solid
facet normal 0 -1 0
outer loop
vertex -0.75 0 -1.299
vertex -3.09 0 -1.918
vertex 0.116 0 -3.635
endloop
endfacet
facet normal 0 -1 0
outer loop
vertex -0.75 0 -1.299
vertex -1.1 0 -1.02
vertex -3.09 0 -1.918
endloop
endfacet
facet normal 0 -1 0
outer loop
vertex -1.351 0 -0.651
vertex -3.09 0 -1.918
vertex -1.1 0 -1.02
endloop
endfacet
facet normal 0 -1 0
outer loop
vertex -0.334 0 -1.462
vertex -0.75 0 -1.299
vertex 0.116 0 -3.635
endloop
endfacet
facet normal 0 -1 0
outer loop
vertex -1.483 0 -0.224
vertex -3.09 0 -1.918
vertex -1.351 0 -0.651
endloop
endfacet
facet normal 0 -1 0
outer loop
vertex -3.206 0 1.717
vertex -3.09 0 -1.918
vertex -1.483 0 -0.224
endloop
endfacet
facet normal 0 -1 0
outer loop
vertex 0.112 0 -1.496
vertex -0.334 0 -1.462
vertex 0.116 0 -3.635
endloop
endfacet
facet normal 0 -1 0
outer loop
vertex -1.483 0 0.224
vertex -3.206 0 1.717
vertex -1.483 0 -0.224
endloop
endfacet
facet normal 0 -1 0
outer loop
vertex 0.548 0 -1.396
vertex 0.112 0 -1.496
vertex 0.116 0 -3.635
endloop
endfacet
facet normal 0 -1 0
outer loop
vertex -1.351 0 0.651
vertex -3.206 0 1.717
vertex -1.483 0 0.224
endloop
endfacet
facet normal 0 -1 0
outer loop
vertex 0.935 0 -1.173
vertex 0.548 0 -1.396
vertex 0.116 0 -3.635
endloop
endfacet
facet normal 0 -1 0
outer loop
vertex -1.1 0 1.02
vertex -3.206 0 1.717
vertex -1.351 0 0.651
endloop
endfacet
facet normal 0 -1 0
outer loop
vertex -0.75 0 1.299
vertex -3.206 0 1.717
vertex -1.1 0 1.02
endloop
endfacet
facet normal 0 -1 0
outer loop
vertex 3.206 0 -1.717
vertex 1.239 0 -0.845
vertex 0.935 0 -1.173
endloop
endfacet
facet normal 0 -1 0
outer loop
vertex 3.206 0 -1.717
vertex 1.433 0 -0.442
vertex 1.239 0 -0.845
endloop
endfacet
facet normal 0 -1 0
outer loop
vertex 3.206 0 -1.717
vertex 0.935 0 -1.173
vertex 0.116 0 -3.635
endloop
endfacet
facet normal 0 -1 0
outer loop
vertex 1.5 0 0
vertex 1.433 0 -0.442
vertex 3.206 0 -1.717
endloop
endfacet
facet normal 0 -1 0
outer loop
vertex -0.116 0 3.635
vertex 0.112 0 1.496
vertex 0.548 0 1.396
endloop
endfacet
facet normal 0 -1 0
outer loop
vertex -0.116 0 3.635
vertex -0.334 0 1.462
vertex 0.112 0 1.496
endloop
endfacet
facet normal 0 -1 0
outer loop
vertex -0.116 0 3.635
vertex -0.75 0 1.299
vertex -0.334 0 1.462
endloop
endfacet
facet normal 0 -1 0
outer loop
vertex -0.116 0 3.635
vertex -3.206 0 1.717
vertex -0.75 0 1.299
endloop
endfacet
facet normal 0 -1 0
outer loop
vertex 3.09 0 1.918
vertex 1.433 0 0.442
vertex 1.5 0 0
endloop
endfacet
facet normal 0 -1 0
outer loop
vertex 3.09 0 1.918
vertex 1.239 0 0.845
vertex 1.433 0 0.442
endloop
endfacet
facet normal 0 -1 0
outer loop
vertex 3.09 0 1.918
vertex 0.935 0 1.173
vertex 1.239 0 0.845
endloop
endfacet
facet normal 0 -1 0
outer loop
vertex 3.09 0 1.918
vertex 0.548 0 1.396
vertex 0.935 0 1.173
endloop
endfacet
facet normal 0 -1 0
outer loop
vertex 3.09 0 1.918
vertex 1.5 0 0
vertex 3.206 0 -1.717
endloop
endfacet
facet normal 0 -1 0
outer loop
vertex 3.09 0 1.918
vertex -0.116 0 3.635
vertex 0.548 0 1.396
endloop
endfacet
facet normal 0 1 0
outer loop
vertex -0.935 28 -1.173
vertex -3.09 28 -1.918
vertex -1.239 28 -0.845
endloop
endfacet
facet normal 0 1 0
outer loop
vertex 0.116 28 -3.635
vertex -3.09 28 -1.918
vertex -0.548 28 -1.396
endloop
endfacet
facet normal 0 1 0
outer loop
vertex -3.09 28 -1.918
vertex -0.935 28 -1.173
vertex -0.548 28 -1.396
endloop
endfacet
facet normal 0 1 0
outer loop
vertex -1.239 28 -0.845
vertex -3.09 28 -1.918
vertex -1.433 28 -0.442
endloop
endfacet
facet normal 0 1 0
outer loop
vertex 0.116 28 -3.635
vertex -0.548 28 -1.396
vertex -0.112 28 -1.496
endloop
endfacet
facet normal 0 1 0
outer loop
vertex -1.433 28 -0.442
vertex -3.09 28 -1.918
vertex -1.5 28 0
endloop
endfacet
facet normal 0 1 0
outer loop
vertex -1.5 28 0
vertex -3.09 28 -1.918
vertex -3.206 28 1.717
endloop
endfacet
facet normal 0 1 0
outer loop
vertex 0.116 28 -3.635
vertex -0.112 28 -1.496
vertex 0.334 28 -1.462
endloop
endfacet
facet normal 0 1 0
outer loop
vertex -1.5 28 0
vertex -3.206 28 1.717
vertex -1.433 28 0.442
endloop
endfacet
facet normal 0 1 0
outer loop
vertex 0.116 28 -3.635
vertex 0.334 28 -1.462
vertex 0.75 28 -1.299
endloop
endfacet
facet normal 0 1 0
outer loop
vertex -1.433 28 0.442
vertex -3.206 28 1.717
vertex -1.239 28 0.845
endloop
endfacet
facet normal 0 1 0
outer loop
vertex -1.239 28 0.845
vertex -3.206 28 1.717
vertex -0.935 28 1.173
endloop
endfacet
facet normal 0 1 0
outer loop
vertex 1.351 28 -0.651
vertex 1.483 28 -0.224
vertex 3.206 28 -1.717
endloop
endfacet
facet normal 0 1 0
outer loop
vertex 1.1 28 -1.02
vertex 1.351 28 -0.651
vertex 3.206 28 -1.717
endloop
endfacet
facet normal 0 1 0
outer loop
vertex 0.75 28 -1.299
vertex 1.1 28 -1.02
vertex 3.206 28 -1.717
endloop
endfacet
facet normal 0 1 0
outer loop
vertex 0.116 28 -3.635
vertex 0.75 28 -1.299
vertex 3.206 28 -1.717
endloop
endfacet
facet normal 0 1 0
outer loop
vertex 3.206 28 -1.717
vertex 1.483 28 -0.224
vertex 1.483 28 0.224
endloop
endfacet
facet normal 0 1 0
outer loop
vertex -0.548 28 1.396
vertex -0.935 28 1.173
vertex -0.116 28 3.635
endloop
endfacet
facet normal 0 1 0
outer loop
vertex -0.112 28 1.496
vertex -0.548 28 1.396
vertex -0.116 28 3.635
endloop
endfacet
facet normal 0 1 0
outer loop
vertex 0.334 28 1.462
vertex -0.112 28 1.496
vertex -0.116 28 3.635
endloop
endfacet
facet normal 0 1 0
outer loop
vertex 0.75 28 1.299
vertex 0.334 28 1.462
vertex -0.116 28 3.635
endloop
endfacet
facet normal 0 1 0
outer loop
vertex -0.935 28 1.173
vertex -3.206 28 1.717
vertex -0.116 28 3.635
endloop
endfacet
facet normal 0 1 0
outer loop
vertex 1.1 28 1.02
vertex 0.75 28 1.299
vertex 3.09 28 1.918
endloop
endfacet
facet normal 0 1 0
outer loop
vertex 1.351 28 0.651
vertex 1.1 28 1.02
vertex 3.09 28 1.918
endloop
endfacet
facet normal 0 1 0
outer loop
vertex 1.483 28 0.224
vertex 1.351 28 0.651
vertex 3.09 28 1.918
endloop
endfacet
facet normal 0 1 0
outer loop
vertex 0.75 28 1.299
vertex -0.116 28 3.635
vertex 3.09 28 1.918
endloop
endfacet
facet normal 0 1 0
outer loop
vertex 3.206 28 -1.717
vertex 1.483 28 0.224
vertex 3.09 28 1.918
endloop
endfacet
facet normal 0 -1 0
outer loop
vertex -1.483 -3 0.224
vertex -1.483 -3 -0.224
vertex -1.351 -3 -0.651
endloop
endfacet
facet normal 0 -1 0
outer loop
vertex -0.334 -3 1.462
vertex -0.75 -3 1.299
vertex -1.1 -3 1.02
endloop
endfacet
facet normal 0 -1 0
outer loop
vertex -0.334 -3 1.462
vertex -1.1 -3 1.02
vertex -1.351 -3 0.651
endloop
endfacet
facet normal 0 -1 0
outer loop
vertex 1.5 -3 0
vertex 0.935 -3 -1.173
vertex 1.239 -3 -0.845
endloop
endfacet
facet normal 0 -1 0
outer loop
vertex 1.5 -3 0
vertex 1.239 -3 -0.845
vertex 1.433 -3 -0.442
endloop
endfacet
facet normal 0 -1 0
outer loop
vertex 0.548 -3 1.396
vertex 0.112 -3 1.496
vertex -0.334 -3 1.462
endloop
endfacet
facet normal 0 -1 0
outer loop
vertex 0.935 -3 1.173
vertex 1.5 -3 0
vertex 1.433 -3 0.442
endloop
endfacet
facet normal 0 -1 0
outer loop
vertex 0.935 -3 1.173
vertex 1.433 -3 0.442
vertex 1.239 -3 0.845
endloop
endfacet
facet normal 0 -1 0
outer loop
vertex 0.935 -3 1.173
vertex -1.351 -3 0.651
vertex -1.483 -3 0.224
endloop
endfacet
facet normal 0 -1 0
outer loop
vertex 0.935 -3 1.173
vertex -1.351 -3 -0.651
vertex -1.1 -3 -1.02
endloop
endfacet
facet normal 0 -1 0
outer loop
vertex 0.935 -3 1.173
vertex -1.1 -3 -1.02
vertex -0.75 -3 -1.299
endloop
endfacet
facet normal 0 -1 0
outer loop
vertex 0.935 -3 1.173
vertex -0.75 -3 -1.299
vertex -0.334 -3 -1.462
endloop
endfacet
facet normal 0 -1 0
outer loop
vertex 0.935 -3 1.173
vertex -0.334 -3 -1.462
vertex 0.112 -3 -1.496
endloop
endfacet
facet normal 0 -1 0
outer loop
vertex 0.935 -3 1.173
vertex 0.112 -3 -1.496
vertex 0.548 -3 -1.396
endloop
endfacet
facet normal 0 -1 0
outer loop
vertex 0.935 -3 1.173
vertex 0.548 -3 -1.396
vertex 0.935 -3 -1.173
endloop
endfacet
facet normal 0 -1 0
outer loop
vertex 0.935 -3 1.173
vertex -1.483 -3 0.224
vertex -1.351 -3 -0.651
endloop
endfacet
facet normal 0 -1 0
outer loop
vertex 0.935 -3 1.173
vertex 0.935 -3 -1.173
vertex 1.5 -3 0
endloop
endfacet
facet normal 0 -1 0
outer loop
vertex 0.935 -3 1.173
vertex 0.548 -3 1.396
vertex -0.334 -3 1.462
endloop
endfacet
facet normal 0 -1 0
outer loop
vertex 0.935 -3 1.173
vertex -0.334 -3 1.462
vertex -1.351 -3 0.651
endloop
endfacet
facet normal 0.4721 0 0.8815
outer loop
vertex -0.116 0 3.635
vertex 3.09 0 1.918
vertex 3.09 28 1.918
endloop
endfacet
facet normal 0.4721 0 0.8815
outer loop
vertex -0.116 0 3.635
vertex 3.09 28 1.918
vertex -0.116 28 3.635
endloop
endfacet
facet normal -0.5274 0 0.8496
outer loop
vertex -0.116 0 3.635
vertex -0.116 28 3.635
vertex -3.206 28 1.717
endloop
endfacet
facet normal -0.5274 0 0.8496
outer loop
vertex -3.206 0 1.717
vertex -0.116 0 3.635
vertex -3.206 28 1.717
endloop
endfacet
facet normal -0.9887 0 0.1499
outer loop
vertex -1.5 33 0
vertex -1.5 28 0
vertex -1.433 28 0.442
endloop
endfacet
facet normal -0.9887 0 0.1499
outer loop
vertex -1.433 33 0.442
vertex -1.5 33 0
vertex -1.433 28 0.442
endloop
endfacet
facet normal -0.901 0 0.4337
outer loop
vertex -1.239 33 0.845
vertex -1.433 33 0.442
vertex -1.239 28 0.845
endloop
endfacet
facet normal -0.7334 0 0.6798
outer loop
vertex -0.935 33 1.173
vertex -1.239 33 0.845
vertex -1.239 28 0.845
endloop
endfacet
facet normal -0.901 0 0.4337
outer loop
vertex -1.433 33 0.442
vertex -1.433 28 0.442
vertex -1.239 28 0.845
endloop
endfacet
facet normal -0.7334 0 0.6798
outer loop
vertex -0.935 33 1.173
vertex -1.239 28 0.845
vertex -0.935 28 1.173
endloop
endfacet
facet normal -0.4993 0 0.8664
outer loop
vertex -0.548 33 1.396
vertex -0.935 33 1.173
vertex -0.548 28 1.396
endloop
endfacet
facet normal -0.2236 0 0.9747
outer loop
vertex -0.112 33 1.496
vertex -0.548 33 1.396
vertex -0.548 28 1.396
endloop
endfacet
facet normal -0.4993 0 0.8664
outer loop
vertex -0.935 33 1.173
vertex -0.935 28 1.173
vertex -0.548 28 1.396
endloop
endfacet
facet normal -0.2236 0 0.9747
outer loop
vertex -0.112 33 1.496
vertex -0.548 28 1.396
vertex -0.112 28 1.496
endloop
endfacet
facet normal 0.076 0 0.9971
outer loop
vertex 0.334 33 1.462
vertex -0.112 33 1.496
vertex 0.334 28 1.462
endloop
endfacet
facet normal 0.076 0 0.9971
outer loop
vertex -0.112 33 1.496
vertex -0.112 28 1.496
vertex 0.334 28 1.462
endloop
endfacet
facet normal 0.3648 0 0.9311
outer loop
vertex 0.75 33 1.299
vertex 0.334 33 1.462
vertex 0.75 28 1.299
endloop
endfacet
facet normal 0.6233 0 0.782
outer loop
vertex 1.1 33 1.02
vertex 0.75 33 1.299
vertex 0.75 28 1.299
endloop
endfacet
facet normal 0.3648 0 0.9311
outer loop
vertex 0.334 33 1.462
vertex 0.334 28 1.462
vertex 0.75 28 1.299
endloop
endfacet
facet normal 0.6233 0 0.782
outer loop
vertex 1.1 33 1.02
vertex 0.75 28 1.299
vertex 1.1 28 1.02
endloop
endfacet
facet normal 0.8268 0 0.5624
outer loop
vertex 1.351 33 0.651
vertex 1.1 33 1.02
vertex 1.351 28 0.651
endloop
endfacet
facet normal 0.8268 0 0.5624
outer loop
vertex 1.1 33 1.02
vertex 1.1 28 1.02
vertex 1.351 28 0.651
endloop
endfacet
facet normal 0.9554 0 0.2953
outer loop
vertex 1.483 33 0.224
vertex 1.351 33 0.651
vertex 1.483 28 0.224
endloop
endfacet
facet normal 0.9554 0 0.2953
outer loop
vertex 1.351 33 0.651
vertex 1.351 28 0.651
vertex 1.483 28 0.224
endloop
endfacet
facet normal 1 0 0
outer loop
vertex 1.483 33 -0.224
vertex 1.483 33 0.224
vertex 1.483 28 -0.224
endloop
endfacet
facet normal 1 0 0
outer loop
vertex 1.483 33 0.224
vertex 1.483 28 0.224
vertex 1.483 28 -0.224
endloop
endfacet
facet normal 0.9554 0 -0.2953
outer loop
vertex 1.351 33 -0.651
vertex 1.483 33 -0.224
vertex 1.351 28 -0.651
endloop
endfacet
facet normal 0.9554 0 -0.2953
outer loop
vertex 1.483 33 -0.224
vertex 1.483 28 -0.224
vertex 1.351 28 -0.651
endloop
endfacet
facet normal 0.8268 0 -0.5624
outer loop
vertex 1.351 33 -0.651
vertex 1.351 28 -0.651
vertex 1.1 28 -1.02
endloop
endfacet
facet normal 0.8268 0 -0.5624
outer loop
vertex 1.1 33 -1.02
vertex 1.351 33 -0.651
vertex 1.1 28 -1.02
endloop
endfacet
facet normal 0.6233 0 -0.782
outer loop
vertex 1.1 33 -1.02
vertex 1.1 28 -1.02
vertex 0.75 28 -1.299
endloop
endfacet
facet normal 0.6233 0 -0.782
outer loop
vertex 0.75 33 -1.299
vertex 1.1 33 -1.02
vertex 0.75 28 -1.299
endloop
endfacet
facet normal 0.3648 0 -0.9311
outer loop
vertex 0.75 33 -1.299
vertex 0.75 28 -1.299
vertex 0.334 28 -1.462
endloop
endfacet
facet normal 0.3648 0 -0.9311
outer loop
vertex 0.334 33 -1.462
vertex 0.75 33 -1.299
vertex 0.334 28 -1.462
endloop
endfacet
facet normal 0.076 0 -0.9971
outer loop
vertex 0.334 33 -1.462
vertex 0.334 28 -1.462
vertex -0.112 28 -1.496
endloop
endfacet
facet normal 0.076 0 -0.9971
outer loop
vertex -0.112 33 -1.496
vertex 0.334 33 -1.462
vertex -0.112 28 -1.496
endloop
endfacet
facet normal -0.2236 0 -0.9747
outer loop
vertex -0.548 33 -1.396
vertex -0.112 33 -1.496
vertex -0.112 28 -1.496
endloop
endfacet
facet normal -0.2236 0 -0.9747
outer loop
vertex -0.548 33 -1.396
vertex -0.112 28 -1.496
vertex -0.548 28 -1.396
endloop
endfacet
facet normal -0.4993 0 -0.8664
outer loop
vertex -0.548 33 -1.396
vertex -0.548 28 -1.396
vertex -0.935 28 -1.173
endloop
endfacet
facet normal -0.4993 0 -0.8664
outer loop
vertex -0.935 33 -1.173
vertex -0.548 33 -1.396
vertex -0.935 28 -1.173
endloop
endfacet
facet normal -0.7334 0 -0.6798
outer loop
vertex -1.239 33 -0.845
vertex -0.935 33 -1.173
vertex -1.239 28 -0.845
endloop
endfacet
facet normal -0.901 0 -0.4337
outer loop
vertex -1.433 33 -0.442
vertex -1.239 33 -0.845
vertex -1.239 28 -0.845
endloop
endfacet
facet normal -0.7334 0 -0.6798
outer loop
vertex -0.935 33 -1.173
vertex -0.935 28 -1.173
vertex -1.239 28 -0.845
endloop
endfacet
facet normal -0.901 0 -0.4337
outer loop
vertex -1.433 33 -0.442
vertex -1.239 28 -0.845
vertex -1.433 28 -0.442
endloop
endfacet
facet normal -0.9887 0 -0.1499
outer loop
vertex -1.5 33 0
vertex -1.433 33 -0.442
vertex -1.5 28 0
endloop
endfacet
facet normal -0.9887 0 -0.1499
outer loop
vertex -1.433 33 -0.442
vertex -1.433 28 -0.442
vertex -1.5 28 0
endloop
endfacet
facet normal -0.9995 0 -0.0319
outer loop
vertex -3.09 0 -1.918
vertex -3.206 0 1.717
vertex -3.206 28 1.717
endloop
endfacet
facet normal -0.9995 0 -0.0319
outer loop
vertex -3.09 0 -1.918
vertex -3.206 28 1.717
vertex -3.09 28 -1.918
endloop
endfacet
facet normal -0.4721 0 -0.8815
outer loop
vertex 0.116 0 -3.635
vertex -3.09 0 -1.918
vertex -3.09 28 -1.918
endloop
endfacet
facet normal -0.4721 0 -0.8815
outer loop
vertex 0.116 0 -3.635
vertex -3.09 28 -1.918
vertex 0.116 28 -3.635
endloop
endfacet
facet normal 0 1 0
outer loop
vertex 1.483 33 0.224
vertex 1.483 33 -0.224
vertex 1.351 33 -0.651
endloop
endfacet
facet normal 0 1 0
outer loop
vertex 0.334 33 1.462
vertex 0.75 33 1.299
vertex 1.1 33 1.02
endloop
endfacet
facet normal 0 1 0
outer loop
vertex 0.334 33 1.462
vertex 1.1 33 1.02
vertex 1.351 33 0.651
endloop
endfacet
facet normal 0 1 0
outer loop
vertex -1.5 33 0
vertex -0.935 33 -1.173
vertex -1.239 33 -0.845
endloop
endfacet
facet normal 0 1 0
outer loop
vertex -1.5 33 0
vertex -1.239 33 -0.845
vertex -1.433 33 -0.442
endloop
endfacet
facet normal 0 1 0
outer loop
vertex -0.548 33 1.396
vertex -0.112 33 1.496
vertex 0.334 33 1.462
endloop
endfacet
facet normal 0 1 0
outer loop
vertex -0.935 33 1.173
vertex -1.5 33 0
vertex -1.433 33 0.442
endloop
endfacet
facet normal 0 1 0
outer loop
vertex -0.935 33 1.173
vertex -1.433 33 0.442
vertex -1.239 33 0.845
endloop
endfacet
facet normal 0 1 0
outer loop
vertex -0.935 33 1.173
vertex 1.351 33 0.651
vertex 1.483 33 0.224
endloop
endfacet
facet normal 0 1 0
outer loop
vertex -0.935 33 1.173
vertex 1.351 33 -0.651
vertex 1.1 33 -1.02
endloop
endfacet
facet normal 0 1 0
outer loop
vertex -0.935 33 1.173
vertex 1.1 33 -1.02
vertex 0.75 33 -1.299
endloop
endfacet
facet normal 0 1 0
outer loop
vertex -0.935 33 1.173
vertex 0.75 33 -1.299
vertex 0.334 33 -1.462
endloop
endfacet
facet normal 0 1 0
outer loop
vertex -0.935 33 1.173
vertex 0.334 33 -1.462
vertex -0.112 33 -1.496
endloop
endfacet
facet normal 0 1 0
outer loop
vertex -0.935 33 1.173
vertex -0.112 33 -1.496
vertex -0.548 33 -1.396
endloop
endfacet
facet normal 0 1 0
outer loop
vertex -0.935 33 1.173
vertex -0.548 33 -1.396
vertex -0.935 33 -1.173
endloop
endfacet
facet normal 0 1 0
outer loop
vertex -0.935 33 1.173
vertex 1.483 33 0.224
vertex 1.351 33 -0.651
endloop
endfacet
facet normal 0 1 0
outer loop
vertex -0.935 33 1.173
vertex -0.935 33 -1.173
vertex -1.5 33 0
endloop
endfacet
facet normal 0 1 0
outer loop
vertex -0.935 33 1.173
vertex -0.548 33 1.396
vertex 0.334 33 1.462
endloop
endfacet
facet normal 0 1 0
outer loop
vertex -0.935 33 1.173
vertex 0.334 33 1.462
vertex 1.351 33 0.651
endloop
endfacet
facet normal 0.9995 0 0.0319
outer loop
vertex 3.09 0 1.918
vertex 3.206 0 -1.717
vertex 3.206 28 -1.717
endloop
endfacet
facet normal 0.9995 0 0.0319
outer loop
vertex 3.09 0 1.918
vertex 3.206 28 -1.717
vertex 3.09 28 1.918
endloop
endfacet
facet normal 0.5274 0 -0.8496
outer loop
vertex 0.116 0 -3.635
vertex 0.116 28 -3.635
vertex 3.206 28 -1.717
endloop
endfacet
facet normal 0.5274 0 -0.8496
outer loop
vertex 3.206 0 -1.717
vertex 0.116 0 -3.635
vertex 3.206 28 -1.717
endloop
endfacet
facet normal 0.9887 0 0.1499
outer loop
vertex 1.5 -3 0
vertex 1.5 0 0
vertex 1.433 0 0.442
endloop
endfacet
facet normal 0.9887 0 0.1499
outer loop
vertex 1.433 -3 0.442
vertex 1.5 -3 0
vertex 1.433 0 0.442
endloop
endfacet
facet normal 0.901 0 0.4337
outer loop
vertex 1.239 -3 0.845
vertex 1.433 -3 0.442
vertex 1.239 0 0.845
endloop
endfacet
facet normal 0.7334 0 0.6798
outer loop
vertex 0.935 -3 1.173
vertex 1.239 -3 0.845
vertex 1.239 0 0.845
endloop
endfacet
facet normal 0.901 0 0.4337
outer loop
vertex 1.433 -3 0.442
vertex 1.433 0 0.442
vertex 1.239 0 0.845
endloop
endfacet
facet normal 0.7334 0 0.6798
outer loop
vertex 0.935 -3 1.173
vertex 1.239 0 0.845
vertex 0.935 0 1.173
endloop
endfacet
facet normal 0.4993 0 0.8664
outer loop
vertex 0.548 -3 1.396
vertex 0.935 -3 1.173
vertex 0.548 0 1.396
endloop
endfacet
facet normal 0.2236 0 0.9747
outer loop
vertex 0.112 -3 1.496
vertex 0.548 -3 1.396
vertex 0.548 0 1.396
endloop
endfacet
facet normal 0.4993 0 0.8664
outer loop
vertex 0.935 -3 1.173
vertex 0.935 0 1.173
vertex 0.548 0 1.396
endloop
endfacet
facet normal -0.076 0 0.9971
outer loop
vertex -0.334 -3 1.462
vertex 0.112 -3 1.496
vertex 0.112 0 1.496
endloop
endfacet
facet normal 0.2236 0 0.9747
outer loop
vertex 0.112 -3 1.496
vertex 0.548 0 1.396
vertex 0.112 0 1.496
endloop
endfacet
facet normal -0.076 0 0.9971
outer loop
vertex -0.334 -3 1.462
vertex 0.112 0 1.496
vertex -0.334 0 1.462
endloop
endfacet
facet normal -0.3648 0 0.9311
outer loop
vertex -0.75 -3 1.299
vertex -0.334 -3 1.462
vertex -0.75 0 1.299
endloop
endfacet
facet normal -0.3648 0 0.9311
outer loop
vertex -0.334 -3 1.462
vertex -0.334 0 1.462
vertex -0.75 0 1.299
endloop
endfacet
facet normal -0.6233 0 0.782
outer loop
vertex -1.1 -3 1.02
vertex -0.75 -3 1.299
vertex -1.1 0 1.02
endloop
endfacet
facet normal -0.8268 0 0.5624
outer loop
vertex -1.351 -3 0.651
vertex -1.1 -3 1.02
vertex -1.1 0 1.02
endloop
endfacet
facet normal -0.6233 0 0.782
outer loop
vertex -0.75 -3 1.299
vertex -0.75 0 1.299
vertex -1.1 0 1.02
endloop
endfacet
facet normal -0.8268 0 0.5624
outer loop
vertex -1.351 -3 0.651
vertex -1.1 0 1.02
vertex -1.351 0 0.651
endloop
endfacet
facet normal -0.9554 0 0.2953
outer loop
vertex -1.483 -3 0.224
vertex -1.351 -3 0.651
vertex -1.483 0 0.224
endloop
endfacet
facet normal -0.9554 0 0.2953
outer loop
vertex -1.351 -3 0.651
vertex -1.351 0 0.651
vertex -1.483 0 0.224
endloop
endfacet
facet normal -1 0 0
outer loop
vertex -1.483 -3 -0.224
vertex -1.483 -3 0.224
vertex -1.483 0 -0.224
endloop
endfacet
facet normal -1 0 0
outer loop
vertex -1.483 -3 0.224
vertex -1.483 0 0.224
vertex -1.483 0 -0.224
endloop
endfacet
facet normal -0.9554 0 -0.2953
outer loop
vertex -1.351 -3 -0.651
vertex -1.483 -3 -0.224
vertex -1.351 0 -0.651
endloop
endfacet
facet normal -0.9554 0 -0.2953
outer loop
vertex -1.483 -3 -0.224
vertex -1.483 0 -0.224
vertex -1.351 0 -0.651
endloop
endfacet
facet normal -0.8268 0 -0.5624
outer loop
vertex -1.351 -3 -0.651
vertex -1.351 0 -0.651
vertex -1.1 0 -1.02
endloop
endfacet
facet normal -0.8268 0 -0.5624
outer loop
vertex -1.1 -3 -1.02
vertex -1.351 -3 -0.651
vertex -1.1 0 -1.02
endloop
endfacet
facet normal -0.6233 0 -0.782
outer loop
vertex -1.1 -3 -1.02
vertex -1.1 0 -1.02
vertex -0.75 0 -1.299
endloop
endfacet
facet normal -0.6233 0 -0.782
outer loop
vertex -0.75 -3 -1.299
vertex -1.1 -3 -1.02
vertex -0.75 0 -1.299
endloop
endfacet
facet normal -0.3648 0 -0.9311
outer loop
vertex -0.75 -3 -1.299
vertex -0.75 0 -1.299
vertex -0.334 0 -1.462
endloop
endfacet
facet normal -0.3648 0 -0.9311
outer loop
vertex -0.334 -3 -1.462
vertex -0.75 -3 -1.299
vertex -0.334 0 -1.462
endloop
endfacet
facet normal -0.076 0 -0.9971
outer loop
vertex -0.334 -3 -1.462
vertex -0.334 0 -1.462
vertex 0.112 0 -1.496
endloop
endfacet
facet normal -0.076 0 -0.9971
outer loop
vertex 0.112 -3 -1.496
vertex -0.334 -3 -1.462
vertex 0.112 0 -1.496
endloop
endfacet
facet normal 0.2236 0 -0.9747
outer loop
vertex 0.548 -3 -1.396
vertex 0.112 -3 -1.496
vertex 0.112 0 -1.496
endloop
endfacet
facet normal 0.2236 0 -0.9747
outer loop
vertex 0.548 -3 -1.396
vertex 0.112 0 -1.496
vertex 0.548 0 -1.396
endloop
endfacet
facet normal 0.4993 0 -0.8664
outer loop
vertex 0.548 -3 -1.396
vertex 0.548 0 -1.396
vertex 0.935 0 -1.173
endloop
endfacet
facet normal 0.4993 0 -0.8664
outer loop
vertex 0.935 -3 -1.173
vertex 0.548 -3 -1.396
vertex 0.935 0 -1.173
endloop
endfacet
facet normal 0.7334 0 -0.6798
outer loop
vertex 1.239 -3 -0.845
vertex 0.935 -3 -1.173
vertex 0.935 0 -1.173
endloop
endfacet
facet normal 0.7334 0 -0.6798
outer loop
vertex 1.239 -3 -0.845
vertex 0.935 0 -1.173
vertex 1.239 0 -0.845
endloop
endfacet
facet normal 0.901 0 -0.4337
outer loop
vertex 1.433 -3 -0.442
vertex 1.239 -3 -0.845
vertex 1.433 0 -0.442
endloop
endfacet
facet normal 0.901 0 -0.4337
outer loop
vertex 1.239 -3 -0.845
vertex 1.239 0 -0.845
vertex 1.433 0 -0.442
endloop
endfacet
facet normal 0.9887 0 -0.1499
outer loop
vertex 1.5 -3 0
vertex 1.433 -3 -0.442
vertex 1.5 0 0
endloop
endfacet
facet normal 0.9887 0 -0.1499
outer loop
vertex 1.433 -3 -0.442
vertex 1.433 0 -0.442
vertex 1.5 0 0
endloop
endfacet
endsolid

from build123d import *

# Parameters (mm, degrees)
F1_DEPTH = 28
F2_R     = 1.5
F3_DEPTH = 3
F4_R     = 1.5
F5_DEPTH = 5


with BuildPart() as f1:
    # F0 (on Front) → F1 (new body)
    with BuildSketch(Plane.XZ):
        Polygon((0.116138, -3.635452), (3.206463, -1.717148), (3.090325, 1.918304), (-0.116138, 3.635452), (-3.206463, 1.717148), (-3.090325, -1.918304), align=None)
    extrude(amount=-F1_DEPTH)

    # F2 (on face) → F3 (join)
    with BuildSketch(Plane.XZ):
        Circle(F2_R)
    extrude(amount=F3_DEPTH)

    # F4 (on face) → F5 (join)
    with BuildSketch(Plane(origin=(0, 28, 0), x_dir=(-1, 0, 0), z_dir=(0, 1, 0))):
        Circle(F4_R)
    extrude(amount=F5_DEPTH)


solid = f1.part
